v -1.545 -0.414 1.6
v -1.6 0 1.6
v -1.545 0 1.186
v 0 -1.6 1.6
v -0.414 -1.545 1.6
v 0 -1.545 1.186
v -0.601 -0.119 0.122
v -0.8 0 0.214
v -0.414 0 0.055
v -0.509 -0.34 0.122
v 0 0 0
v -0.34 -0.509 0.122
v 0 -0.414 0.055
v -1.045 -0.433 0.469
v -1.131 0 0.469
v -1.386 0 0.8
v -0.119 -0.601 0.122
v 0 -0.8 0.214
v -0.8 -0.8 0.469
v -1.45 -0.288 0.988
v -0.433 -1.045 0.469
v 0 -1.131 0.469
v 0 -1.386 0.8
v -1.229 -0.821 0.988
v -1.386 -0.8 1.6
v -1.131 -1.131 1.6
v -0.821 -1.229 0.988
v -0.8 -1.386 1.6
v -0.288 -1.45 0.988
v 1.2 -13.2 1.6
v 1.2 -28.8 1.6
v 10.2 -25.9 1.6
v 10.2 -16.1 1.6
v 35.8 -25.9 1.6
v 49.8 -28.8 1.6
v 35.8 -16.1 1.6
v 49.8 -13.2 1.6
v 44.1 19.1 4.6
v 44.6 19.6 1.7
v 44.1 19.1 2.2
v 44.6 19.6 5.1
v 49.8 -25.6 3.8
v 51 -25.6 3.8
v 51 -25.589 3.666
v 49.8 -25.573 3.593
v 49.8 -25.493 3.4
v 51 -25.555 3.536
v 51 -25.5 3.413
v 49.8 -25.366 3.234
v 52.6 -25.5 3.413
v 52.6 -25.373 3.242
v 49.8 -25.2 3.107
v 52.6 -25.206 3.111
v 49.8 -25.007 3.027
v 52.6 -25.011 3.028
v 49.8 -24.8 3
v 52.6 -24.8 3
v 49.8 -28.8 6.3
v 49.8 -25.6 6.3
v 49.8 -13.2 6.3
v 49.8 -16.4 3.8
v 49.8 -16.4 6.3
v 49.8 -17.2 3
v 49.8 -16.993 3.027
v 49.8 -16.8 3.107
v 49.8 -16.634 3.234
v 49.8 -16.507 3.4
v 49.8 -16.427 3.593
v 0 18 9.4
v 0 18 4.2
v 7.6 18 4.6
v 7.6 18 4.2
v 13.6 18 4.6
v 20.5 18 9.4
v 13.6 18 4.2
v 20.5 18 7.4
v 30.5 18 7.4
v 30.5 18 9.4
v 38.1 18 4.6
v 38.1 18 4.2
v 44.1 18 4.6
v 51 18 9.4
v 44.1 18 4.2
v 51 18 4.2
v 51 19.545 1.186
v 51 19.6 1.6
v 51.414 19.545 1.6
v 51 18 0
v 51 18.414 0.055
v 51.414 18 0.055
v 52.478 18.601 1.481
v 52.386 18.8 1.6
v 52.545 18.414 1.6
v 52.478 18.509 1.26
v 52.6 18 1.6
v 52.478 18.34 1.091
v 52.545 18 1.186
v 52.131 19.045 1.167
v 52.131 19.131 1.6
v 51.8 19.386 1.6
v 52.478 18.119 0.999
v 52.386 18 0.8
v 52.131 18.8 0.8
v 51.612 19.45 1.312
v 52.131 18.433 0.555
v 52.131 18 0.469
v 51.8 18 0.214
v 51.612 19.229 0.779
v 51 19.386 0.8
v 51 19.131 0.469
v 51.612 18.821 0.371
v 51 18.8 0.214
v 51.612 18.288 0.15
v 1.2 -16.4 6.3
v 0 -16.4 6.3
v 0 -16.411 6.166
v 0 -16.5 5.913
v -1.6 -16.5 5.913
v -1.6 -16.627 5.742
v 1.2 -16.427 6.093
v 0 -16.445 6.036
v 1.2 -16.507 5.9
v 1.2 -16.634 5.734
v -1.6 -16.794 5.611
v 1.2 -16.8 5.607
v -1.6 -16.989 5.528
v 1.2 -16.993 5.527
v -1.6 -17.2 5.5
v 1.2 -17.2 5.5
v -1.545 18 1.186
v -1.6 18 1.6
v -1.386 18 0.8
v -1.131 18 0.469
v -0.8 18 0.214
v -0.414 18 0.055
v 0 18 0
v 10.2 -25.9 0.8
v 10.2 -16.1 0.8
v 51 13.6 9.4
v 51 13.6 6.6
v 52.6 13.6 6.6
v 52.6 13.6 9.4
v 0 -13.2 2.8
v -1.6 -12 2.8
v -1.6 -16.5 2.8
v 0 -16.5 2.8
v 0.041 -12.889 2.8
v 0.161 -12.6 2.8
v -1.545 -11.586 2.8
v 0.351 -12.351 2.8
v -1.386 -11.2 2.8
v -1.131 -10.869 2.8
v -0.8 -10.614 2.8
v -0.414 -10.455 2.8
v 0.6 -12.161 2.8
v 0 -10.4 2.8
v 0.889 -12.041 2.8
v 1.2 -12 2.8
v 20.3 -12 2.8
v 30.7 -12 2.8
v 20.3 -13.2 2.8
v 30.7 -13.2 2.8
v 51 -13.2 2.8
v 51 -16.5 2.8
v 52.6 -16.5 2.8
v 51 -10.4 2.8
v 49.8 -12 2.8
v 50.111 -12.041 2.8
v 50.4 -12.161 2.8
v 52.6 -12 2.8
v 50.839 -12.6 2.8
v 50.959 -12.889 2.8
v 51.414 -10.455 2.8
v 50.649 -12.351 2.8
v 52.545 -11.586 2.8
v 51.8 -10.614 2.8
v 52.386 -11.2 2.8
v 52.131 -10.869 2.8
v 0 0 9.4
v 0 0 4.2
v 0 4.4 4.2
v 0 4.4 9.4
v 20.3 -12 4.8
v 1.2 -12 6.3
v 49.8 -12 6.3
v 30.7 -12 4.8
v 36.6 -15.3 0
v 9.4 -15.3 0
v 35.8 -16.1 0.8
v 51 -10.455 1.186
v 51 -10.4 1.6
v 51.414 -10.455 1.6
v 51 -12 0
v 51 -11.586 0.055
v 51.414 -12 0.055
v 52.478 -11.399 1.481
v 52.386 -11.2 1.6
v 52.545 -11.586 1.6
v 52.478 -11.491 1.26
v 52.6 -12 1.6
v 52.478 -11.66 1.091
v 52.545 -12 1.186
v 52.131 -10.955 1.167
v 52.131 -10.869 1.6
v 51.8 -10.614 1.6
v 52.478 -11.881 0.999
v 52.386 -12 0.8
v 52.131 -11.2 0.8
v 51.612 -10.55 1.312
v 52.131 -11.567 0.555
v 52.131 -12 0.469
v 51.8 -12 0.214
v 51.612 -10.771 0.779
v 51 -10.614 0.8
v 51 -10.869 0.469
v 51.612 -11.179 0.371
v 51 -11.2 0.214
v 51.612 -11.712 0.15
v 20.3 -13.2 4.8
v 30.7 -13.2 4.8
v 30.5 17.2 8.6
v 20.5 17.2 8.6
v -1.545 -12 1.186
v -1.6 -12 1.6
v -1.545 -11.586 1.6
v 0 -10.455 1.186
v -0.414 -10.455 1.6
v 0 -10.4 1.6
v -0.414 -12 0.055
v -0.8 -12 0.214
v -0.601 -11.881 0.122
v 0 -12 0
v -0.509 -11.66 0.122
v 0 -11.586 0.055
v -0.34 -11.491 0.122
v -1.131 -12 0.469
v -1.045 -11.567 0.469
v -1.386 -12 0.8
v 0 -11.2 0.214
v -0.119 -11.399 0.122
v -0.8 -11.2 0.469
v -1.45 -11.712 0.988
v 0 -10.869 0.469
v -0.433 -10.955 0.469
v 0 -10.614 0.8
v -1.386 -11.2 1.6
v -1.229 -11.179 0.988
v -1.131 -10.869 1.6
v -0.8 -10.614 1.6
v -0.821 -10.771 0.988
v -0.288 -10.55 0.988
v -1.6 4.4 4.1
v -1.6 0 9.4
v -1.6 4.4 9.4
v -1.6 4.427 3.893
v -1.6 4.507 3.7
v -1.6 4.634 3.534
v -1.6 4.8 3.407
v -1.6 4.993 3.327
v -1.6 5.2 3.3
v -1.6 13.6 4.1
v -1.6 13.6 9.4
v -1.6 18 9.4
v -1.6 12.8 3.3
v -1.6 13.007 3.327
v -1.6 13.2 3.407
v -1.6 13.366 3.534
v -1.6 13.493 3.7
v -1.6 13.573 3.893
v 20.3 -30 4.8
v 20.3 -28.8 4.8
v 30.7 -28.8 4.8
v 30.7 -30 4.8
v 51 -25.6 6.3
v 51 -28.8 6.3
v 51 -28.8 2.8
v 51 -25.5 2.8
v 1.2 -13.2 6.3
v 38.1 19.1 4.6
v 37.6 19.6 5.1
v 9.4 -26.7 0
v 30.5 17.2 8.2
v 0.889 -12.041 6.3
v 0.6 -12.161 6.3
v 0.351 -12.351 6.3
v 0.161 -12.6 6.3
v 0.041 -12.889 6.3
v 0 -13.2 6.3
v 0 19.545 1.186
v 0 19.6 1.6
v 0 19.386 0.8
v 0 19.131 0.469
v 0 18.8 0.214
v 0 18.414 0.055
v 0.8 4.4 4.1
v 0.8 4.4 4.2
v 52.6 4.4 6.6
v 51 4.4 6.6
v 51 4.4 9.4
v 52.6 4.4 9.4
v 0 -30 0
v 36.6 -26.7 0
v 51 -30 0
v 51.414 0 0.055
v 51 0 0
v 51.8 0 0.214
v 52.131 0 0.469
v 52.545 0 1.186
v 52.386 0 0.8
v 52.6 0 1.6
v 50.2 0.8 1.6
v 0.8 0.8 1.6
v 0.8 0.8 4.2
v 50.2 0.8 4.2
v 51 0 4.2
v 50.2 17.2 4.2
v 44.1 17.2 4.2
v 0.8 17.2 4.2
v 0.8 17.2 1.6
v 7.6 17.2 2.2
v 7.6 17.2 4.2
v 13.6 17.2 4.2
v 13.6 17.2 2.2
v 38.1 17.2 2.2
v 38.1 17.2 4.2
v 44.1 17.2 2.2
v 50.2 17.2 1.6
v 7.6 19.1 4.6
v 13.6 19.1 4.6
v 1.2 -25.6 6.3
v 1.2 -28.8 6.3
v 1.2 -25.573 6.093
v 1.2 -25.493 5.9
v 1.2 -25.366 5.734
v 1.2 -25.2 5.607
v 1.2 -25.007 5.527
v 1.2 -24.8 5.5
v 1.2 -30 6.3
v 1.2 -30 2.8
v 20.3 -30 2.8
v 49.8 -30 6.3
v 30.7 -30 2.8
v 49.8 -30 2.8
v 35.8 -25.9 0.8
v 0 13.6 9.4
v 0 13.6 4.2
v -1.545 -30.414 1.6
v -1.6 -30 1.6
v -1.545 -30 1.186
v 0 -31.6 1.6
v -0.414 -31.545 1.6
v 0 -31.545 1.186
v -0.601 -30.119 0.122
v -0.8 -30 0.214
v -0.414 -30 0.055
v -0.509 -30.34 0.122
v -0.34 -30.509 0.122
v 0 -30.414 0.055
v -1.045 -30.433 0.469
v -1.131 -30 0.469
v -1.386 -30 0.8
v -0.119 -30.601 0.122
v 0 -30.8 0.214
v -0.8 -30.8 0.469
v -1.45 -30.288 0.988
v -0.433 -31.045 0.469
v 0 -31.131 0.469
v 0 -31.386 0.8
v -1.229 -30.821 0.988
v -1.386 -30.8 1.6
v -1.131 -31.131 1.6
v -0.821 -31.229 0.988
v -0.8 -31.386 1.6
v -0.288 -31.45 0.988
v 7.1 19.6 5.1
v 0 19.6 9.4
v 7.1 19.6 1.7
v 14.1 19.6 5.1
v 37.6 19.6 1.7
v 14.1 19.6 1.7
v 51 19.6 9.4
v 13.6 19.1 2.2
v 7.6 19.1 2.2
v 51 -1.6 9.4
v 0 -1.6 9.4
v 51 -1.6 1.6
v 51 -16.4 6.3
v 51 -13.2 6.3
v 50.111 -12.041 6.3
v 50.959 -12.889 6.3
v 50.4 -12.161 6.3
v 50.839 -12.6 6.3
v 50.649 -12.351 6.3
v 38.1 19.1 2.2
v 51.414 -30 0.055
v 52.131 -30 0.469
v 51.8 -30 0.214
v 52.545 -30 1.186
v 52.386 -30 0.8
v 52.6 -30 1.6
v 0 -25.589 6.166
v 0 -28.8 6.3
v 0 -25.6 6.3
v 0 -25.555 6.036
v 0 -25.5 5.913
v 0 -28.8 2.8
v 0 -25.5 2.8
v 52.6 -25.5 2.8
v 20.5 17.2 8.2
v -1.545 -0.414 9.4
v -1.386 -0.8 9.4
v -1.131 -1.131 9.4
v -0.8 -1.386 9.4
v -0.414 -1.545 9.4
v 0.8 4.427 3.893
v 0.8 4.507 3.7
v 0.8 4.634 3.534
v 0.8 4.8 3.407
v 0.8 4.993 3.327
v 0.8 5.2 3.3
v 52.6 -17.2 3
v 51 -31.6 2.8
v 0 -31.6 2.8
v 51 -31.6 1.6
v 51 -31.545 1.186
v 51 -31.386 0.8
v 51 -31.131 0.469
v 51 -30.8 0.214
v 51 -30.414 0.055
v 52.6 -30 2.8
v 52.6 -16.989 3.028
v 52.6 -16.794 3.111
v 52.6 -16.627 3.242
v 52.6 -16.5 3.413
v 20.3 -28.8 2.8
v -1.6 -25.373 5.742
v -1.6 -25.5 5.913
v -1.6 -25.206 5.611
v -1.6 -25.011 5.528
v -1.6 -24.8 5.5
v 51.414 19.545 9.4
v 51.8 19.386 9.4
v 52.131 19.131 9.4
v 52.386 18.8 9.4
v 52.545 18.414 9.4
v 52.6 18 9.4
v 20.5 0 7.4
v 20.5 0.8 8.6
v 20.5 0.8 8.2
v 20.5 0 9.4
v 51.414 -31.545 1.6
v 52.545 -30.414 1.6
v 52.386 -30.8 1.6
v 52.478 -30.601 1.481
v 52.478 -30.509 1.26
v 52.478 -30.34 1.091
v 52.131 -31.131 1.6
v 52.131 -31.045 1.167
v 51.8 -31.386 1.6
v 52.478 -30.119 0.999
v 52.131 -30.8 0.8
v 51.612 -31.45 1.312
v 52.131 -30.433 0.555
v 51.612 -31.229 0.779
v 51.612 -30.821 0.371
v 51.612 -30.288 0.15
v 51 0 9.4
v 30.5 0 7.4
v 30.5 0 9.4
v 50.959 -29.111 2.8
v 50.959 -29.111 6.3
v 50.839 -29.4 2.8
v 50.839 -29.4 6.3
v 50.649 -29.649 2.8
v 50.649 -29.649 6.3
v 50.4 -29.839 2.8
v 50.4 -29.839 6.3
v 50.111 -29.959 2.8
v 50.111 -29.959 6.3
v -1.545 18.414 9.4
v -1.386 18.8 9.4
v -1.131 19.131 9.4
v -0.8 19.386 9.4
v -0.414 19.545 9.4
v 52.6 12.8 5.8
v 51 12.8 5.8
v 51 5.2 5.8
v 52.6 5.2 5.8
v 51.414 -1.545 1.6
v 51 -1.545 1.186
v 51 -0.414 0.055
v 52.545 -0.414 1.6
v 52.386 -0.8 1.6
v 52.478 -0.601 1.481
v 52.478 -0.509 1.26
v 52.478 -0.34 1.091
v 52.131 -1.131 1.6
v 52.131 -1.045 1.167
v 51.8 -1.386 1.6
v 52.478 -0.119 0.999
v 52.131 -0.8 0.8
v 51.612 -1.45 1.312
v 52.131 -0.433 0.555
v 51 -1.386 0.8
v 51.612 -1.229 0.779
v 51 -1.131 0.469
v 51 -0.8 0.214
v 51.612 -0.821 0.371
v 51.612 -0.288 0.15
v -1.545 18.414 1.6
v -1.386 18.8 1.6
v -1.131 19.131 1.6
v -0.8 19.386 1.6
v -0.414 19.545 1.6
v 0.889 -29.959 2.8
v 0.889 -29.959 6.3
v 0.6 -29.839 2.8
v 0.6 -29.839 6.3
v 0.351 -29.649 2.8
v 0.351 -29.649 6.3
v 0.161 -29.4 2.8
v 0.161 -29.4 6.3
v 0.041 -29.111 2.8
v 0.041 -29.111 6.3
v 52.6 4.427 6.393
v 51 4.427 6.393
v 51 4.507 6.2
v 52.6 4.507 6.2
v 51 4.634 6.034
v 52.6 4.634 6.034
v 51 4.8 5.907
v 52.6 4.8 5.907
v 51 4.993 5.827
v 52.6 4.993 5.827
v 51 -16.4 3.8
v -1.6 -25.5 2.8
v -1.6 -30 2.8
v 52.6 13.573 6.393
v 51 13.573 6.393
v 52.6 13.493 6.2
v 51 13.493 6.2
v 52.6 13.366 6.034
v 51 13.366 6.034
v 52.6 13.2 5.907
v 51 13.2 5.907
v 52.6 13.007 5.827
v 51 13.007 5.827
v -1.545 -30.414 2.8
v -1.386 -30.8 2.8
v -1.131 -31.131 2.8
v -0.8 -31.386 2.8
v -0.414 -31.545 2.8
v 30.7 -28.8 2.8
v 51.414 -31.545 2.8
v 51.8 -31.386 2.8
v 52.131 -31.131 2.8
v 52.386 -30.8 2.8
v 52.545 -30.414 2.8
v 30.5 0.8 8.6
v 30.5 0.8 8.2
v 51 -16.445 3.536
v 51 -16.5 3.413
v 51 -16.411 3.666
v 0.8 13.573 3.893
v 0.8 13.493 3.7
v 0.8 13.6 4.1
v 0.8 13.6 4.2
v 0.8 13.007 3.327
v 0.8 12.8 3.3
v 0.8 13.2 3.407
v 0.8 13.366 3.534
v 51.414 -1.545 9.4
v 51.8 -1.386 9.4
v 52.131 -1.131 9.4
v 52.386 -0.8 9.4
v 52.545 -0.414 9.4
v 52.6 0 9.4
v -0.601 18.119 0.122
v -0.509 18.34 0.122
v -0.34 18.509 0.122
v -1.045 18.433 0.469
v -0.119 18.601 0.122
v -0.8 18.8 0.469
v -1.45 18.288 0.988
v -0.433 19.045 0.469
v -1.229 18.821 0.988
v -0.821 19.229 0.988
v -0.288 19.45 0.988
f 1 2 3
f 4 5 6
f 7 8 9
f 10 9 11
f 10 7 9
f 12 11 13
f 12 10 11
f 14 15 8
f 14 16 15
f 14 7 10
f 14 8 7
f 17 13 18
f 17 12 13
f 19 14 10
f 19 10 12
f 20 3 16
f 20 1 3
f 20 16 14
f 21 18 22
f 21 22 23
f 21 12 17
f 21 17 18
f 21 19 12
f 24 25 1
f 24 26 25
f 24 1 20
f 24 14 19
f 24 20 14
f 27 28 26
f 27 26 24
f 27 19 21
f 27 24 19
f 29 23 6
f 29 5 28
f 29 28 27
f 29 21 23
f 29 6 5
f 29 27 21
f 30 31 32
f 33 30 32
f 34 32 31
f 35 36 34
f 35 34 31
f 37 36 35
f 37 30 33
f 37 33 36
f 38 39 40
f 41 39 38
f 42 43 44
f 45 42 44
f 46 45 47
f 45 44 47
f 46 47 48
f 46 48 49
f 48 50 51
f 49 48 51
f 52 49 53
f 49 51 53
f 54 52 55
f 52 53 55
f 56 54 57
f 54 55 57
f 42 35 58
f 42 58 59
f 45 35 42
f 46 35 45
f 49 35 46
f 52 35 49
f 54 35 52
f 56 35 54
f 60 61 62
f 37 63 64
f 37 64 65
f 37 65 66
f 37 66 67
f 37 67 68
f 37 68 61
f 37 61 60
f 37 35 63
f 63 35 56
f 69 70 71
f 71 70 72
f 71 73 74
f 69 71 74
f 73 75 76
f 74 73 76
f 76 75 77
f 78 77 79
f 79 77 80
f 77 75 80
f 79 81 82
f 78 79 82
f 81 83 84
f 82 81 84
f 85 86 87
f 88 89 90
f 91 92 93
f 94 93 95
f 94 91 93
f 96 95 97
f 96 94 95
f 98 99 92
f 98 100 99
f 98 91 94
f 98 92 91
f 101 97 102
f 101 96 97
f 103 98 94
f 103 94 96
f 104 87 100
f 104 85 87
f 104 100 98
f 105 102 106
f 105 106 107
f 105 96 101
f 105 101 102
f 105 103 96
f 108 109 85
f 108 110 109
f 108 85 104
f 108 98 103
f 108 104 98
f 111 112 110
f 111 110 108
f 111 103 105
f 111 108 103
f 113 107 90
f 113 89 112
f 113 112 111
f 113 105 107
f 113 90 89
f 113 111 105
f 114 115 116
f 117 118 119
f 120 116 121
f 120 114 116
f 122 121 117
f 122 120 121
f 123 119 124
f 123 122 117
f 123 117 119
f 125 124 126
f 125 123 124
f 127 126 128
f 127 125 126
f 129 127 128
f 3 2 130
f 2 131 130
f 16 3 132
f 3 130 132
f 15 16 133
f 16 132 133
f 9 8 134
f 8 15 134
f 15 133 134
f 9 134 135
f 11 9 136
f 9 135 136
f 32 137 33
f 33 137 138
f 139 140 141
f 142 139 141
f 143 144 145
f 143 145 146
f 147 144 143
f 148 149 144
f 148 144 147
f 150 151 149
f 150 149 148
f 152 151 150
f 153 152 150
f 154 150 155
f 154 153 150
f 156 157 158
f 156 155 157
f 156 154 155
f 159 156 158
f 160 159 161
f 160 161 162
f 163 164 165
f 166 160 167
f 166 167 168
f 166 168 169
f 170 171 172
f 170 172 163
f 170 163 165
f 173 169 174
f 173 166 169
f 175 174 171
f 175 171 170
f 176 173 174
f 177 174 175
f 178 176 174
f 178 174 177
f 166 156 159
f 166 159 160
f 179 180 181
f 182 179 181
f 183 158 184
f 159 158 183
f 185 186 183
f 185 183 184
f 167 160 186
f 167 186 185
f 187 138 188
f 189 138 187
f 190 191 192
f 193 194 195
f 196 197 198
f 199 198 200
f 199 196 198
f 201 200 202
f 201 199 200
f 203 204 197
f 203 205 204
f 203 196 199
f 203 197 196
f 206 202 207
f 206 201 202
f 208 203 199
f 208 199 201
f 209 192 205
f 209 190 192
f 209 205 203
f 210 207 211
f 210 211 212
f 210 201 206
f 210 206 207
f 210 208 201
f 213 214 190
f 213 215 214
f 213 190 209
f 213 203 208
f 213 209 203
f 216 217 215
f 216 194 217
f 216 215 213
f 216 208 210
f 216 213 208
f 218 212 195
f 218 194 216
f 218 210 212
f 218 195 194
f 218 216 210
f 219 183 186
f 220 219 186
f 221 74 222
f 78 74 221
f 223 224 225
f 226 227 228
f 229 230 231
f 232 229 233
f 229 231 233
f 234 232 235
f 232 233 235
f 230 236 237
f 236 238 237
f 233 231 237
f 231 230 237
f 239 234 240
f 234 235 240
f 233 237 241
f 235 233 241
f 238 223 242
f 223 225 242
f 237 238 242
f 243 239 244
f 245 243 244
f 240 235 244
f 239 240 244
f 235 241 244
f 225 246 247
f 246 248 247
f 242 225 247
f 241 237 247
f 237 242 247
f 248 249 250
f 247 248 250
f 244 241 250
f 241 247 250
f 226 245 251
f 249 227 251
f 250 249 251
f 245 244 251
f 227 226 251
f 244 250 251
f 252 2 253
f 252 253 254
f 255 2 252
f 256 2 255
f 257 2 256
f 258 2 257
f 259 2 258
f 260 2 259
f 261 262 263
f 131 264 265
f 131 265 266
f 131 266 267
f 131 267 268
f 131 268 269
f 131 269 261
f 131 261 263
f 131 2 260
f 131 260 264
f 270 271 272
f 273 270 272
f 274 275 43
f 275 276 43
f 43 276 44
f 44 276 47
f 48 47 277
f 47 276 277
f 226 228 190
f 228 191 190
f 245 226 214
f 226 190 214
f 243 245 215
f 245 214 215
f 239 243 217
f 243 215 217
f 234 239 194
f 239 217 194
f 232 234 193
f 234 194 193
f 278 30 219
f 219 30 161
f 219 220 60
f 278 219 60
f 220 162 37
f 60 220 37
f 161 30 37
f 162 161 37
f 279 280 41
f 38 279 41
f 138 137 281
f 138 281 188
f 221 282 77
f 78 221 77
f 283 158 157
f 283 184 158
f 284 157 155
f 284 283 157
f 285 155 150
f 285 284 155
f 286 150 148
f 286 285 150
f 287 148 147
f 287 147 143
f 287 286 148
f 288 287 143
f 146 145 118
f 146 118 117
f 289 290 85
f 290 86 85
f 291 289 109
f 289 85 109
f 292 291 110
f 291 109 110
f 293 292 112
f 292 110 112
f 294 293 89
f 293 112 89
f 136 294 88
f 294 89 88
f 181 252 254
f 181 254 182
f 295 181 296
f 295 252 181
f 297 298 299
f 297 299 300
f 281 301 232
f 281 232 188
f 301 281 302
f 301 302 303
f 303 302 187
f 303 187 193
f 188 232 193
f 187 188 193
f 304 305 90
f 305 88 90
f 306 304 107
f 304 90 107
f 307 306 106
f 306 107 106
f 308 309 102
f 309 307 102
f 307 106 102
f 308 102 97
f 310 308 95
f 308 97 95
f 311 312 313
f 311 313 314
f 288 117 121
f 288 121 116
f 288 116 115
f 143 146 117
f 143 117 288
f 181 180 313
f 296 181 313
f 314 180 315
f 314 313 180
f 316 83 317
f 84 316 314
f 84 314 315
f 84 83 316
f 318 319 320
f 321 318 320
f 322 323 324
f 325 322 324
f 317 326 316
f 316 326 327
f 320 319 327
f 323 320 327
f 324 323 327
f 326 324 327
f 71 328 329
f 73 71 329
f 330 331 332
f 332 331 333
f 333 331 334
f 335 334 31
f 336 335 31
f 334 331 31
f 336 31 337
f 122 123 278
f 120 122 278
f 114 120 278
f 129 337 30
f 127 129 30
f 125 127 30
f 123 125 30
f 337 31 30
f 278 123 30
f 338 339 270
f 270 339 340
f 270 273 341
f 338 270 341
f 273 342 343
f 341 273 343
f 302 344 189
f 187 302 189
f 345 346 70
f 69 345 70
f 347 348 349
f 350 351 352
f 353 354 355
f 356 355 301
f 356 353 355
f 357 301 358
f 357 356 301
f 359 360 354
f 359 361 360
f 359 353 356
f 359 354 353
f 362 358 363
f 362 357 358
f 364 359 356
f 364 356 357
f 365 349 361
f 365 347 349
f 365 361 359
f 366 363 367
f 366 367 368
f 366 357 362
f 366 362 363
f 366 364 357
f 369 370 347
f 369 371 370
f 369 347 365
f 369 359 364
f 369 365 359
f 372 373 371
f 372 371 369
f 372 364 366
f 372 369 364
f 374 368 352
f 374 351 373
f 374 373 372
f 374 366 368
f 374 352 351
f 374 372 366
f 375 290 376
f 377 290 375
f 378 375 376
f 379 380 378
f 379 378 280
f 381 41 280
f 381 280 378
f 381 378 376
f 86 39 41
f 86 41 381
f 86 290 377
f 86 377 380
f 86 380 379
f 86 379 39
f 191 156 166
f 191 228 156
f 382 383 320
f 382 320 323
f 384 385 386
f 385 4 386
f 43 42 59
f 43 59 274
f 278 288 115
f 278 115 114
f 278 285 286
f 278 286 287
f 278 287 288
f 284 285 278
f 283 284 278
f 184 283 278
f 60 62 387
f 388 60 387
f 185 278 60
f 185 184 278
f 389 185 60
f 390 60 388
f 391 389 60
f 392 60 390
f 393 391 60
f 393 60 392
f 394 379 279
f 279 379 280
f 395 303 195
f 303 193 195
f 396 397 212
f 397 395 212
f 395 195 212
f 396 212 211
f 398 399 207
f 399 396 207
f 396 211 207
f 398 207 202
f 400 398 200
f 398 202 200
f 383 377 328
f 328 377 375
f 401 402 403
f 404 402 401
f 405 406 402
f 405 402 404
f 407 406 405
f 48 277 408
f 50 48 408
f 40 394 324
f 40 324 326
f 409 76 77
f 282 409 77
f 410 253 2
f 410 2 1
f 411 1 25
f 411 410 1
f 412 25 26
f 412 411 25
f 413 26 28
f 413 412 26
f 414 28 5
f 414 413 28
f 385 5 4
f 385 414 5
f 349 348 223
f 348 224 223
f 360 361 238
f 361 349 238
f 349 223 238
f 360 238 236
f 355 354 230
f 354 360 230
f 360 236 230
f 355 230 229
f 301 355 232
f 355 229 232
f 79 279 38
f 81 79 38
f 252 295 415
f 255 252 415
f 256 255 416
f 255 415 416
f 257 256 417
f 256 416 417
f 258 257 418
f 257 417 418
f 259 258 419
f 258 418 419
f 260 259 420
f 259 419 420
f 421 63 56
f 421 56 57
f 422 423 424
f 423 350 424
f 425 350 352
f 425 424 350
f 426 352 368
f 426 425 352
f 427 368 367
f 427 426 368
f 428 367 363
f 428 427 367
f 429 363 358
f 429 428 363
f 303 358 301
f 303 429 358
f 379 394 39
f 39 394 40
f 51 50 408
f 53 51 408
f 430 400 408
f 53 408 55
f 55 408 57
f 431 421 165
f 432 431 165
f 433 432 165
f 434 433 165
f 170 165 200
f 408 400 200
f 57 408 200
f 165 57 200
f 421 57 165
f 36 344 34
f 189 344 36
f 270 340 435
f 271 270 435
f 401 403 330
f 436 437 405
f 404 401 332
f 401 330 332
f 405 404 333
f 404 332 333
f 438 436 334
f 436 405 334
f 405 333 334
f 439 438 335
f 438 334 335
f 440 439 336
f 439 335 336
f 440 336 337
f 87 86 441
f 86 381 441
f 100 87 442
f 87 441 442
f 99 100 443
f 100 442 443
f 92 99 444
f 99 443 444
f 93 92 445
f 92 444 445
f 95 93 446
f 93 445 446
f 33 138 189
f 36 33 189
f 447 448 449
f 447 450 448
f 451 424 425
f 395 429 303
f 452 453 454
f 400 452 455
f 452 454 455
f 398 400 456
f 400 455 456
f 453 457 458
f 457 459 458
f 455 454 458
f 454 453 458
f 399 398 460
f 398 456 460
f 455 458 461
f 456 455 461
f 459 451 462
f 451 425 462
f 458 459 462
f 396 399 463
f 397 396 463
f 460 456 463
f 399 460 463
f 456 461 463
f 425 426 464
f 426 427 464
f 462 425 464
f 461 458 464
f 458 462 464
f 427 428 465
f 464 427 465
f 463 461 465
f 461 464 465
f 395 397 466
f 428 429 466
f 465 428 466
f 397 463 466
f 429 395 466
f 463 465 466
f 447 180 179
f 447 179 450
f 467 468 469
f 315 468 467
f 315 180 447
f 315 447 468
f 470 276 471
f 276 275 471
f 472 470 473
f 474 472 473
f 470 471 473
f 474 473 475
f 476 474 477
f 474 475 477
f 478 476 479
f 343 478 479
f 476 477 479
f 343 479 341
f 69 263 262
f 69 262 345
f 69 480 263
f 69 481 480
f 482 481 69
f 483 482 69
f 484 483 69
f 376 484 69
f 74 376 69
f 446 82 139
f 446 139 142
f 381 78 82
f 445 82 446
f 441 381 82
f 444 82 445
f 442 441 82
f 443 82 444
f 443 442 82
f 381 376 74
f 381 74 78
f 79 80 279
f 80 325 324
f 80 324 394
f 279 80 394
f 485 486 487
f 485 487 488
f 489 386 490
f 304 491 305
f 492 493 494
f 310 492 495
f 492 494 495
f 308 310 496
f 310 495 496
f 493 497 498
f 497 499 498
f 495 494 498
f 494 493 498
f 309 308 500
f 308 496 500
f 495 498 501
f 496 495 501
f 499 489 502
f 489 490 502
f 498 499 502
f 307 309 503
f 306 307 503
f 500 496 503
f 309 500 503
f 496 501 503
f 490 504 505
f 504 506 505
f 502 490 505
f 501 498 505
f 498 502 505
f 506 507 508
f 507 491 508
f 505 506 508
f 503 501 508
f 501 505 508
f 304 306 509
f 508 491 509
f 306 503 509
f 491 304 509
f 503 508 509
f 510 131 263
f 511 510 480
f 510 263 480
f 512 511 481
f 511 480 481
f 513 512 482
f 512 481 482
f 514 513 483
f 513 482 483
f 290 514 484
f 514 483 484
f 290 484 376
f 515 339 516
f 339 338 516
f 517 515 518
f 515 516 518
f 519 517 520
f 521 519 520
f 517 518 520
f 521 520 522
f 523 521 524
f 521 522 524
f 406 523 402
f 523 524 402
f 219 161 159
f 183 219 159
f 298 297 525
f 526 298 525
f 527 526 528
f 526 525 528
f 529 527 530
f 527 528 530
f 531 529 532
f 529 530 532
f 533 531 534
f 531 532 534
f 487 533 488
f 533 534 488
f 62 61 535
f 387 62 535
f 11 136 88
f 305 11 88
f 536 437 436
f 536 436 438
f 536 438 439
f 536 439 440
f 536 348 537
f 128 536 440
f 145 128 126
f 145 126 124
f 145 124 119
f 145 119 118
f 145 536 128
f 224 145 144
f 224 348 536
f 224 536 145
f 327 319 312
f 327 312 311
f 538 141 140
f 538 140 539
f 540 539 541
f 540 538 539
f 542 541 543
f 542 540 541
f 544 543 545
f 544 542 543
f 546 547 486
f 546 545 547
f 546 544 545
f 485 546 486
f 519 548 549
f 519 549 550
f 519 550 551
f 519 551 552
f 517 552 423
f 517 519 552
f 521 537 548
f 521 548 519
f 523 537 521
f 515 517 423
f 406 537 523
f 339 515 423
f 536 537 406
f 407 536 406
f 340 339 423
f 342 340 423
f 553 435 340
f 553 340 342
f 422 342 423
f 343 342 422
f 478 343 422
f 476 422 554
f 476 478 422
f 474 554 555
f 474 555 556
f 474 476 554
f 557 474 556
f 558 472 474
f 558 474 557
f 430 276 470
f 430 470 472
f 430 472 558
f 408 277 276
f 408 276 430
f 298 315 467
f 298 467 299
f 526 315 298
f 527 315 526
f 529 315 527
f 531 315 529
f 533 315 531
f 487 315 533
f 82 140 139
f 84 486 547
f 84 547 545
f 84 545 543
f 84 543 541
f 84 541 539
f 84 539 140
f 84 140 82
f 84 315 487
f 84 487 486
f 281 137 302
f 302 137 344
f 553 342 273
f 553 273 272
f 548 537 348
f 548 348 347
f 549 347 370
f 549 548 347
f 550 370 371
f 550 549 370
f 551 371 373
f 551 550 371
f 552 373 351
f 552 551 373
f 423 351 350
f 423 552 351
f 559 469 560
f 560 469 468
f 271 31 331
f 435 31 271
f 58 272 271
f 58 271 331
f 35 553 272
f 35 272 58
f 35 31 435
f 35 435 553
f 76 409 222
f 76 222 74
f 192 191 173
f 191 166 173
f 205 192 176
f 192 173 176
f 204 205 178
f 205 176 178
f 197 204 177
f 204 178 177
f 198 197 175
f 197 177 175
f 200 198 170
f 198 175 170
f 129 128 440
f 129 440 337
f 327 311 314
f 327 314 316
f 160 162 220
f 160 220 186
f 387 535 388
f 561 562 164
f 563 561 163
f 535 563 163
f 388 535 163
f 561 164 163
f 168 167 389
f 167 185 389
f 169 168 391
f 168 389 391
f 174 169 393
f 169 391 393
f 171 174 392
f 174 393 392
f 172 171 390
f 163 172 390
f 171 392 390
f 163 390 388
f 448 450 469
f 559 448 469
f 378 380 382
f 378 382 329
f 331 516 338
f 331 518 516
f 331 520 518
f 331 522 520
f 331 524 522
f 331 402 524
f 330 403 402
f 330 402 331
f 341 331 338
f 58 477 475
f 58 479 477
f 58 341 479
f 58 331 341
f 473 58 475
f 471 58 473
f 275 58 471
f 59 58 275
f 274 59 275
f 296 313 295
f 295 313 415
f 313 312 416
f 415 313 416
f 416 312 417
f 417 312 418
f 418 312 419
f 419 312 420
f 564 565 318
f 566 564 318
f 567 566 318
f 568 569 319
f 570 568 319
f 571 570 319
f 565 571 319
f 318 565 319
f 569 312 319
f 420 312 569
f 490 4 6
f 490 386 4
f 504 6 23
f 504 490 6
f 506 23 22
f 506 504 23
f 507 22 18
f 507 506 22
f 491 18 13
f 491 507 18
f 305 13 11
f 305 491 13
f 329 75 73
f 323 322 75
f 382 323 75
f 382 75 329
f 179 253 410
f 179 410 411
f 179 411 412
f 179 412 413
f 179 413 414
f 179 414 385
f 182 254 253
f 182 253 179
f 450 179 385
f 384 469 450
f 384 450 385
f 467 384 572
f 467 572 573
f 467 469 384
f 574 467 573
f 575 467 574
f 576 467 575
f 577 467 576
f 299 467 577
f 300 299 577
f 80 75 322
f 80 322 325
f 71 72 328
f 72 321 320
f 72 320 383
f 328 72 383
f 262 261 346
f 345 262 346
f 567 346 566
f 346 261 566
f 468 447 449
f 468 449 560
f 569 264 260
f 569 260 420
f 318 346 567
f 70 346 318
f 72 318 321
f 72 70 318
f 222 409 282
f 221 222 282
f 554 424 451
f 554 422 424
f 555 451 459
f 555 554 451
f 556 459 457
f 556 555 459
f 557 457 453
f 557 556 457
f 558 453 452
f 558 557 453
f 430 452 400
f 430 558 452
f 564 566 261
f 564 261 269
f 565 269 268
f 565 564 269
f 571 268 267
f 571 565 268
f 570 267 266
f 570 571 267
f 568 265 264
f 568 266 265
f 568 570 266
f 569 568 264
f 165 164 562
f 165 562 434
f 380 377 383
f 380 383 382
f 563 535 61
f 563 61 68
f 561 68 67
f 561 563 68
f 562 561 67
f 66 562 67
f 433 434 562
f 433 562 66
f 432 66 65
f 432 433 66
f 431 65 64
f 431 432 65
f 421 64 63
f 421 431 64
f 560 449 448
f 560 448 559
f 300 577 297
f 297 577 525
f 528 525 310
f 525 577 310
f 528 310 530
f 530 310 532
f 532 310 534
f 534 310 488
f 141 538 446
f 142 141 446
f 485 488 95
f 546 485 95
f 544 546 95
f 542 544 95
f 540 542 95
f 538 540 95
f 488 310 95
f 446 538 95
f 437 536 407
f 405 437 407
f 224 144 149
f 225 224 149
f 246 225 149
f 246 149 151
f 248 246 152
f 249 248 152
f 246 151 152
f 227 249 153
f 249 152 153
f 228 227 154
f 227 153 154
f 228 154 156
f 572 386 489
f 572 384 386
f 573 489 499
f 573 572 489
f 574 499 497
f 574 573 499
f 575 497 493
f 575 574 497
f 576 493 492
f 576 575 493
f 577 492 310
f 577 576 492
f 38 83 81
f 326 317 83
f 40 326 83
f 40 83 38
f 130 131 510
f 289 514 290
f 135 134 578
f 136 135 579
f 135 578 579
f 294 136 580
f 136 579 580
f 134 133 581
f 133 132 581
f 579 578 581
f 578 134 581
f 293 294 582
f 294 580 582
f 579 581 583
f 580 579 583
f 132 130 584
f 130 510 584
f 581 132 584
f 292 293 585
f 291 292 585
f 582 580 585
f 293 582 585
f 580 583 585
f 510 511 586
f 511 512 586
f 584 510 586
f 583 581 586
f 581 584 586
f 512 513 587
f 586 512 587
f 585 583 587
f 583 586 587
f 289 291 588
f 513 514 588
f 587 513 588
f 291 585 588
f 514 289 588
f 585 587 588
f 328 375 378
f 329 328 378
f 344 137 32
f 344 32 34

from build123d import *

# Parameters (mm, degrees)
BOX009_W        = 6
BOX009_H        = 10
BOX009_DEPTH    = 2.4
BOX006_W        = 10
BOX006_H        = 9.2
BOX006_DEPTH    = 7
FILLET002_R     = 0.8
BOX019_W        = 10
BOX019_H        = 9.2
BOX019_DEPTH    = 7
FILLET003_R     = 0.8
BOX008_W        = 6
BOX008_H        = 10
BOX008_DEPTH    = 2.4
BOX003_W        = 49.4
BOX003_H        = 16.4
BOX003_DEPTH    = 2.6
BOX002_W        = 51
BOX002_H        = 18
BOX002_DEPTH    = 2.6
BOX004_W        = 10
BOX004_H        = 1
BOX004_DEPTH    = 2
CHAMFER_SIZE    = 0.8
BOX005_W        = 10
BOX005_H        = 1
BOX005_DEPTH    = 2
CHAMFER001_SIZE = 0.8
BOX001_W        = 51
BOX001_H        = 18
BOX001_DEPTH    = 9.4
BOX_W           = 54.2
BOX_H           = 21.2
BOX_DEPTH       = 9.4
FILLET_R        = 1.6
CHAMFER002_SIZE = 0.5
BOX017_W        = 10.4
BOX017_H        = 5
BOX017_DEPTH    = 2
BOX018_W        = 10.4
BOX018_H        = 5
BOX018_DEPTH    = 2
BOX020_W        = 10
BOX020_H        = 9.2
BOX020_DEPTH    = 4.6
FILLET004_R     = 0.8
BOX021_W        = 10
BOX021_H        = 9.2
BOX021_DEPTH    = 6
FILLET005_R     = 0.8
BOX014_W        = 25.6
BOX014_H        = 9.8
BOX014_DEPTH    = 1.6
BOX013_W        = 48.6
BOX013_H        = 15.6
BOX013_DEPTH    = 4.8
BOX012_W        = 51
BOX012_H        = 18
BOX012_DEPTH    = 4.7
BOX022_W        = 1.6
BOX022_H        = 9
BOX022_DEPTH    = 5
BOX023_W        = 1.6
BOX023_H        = 9
BOX023_DEPTH    = 5
BOX011_W        = 51
BOX011_H        = 18
BOX011_DEPTH    = 9.4
BOX010_W        = 54.2
BOX010_H        = 21.2
BOX010_DEPTH    = 2.8
FILLET001_R     = 1.6
CHAMFER003_SIZE = 0.8
FILLET006_R     = 1.2


with BuildPart() as button2:
    # Box009 → Box009 (new body)
    with BuildSketch(Plane(origin=(38.1, 14, 2.2), x_dir=(1, 0, 0), z_dir=(0, 0, 1))):
        with Locations((3, 5)):
            Rectangle(BOX009_W, BOX009_H)
    extrude(amount=BOX009_DEPTH)


with BuildPart() as usb_buchse1:
    # Box006 → Box006 (new body)
    with BuildSketch(Plane(origin=(-5, 4.4, 3.3), x_dir=(1, 0, 0), z_dir=(0, 0, 1))):
        with Locations((5, 4.6)):
            Rectangle(BOX006_W, BOX006_H)
    extrude(amount=BOX006_DEPTH)

    # Fillet002
    fillet002_edges = [usb_buchse1.edges().sort_by_distance(p)[0] for p in [
        (0, 4.4, 3.3),
        (0, 13.6, 3.3),
    ]]
    fillet(fillet002_edges, radius=FILLET002_R)


with BuildPart() as usb_buchse2:
    # Box019 → Box019 (new body)
    with BuildSketch(Plane(origin=(47, 4.4, 5.8), x_dir=(1, 0, 0), z_dir=(0, 0, 1))):
        with Locations((5, 4.6)):
            Rectangle(BOX019_W, BOX019_H)
    extrude(amount=BOX019_DEPTH)

    # Fillet003
    fillet003_edges = [usb_buchse2.edges().sort_by_distance(p)[0] for p in [
        (52, 4.4, 5.8),
        (52, 13.6, 5.8),
    ]]
    fillet(fillet003_edges, radius=FILLET003_R)


with BuildPart() as bottom_cutouts:
    # Box008 → Box008 (new body)
    with BuildSketch(Plane(origin=(7.6, 14, 2.2), x_dir=(1, 0, 0), z_dir=(0, 0, 1))):
        with Locations((3, 5)):
            Rectangle(BOX008_W, BOX008_H)
    extrude(amount=BOX008_DEPTH)

    # Fusion001: union Button2, USB_Buchse1, USB_Buchse2
    add(button2.part)
    add(usb_buchse1.part)
    add(usb_buchse2.part)


with BuildPart() as auflage_innen:
    # Box003 → Box003 (new body)
    with BuildSketch(Plane(origin=(0.8, 0.8, 1.6), x_dir=(1, 0, 0), z_dir=(0, 0, 1))):
        with Locations((24.7, 8.2)):
            Rectangle(BOX003_W, BOX003_H)
    extrude(amount=BOX003_DEPTH)


with BuildPart() as auflage:
    # Box002 → Box002 (new body)
    with BuildSketch(Plane.XY.offset(1.6)):
        with Locations((25.5, 9)):
            Rectangle(BOX002_W, BOX002_H)
    extrude(amount=BOX002_DEPTH)

    # Cut001: cut Auflage_innen
    add(auflage_innen.part, mode=Mode.SUBTRACT)


with BuildPart() as haken1:
    # Box004 → Box004 (new body)
    with BuildSketch(Plane(origin=(20.5, -0.2, 7.4), x_dir=(1, 0, 0), z_dir=(0, 0, 1))):
        with Locations((5, 0.5)):
            Rectangle(BOX004_W, BOX004_H)
    extrude(amount=BOX004_DEPTH)

    # Chamfer
    chamfer_edges = [haken1.edges().sort_by_distance(p)[0] for p in [
        (25.5, 0.8, 7.4),
        (25.5, 0.8, 9.4),
    ]]
    chamfer(chamfer_edges, length=CHAMFER_SIZE)


with BuildPart() as haken2:
    # Box005 → Box005 (new body)
    with BuildSketch(Plane(origin=(20.5, 17.2, 7.4), x_dir=(1, 0, 0), z_dir=(0, 0, 1))):
        with Locations((5, 0.5)):
            Rectangle(BOX005_W, BOX005_H)
    extrude(amount=BOX005_DEPTH)

    # Chamfer001
    chamfer001_edges = [haken2.edges().sort_by_distance(p)[0] for p in [
        (25.5, 17.2, 7.4),
        (25.5, 17.2, 9.4),
    ]]
    chamfer(chamfer001_edges, length=CHAMFER001_SIZE)


with BuildPart() as unten_innen:
    # Box001 → Box001 (new body)
    with BuildSketch(Plane.XY.offset(1.6)):
        with Locations((25.5, 9)):
            Rectangle(BOX001_W, BOX001_H)
    extrude(amount=BOX001_DEPTH)


with BuildPart() as case_bottom:
    # Box → Box (new body)
    with BuildSketch(Plane(origin=(-1.6, -1.6, 0), x_dir=(1, 0, 0), z_dir=(0, 0, 1))):
        with Locations((27.1, 10.6)):
            Rectangle(BOX_W, BOX_H)
    extrude(amount=BOX_DEPTH)

    # Cut: cut unten_innen
    add(unten_innen.part, mode=Mode.SUBTRACT)

    # Fillet
    fillet_edges = [case_bottom.edges().sort_by_distance(p)[0] for p in [
        (-1.6, -1.6, 4.7),
        (-1.6, 19.6, 4.7),
        (-1.6, 9, 0),
        (25.5, -1.6, 0),
        (52.6, -1.6, 4.7),
        (25.5, 19.6, 0),
        (52.6, 19.6, 4.7),
        (52.6, 9, 0),
    ]]
    fillet(fillet_edges, radius=FILLET_R)

    # Fusion: union Auflage, Haken1, Haken2
    add(auflage.part)
    add(haken1.part)
    add(haken2.part)

    # Cut004: cut bottom_cutouts
    add(bottom_cutouts.part, mode=Mode.SUBTRACT)

    # Chamfer002
    chamfer002_edges = [case_bottom.edges().sort_by_distance(p)[0] for p in [
        (10.6, 19.6, 4.6),
        (13.6, 19.6, 3.4),
        (10.6, 19.6, 2.2),
        (7.6, 19.6, 3.4),
        (44.1, 19.6, 3.4),
        (41.1, 19.6, 2.2),
        (38.1, 19.6, 3.4),
        (41.1, 19.6, 4.6),
    ]]
    chamfer(chamfer002_edges, length=CHAMFER002_SIZE)


with BuildPart() as oese1:
    # Box017 → Box017 (new body)
    with BuildSketch(Plane(origin=(20.3, -33, 2.8), x_dir=(1, 0, 0), z_dir=(0, 0, 1))):
        with Locations((5.2, 2.5)):
            Rectangle(BOX017_W, BOX017_H)
    extrude(amount=BOX017_DEPTH)


with BuildPart() as oese2:
    # Box018 → Box018 (new body)
    with BuildSketch(Plane(origin=(20.3, -15, 2.8), x_dir=(1, 0, 0), z_dir=(0, 0, 1))):
        with Locations((5.2, 2.5)):
            Rectangle(BOX018_W, BOX018_H)
    extrude(amount=BOX018_DEPTH)


with BuildPart() as usb_buchse3:
    # Box020 → Box020 (new body)
    with BuildSketch(Plane(origin=(-5, -25.6, 5.5), x_dir=(1, 0, 0), z_dir=(0, 0, 1))):
        with Locations((5, 4.6)):
            Rectangle(BOX020_W, BOX020_H)
    extrude(amount=BOX020_DEPTH)

    # Fillet004
    fillet004_edges = [usb_buchse3.edges().sort_by_distance(p)[0] for p in [
        (0, -25.6, 5.5),
        (0, -16.4, 5.5),
    ]]
    fillet(fillet004_edges, radius=FILLET004_R)


with BuildPart() as usb_buchse4:
    # Box021 → Box021 (new body)
    with BuildSketch(Plane(origin=(47, -25.6, 3), x_dir=(1, 0, 0), z_dir=(0, 0, 1))):
        with Locations((5, 4.6)):
            Rectangle(BOX021_W, BOX021_H)
    extrude(amount=BOX021_DEPTH)

    # Fillet005
    fillet005_edges = [usb_buchse4.edges().sort_by_distance(p)[0] for p in [
        (52, -25.6, 3),
        (52, -16.4, 3),
    ]]
    fillet(fillet005_edges, radius=FILLET005_R)


with BuildPart() as top_cutouts:
    # Box014 → Box014 (new body)
    with BuildSketch(Plane(origin=(10.2, -25.9, 0), x_dir=(1, 0, 0), z_dir=(0, 0, 1))):
        with Locations((12.8, 4.9)):
            Rectangle(BOX014_W, BOX014_H)
    extrude(amount=BOX014_DEPTH)

    # Fusion003: union Oese1, Oese2, USB-Buchse3, USB-Buchse4
    add(oese1.part)
    add(oese2.part)
    add(usb_buchse3.part)
    add(usb_buchse4.part)


with BuildPart() as rahmen_innen:
    # Box013 → Box013 (new body)
    with BuildSketch(Plane(origin=(1.2, -28.8, 1.6), x_dir=(1, 0, 0), z_dir=(0, 0, 1))):
        with Locations((24.3, 7.8)):
            Rectangle(BOX013_W, BOX013_H)
    extrude(amount=BOX013_DEPTH)


with BuildPart() as rahmen:
    # Box012 → Box012 (new body)
    with BuildSketch(Plane(origin=(0, -30, 1.6), x_dir=(1, 0, 0), z_dir=(0, 0, 1))):
        with Locations((25.5, 9)):
            Rectangle(BOX012_W, BOX012_H)
    extrude(amount=BOX012_DEPTH)

    # Cut003: cut Rahmen_innen
    add(rahmen_innen.part, mode=Mode.SUBTRACT)


with BuildPart() as nut1:
    # Box022 → Box022 (new body)
    with BuildSketch(Plane(origin=(-1.6, -25.5, 2.8), x_dir=(1, 0, 0), z_dir=(0, 0, 1))):
        with Locations((0.8, 4.5)):
            Rectangle(BOX022_W, BOX022_H)
    extrude(amount=BOX022_DEPTH)


with BuildPart() as nut2:
    # Box023 → Box023 (new body)
    with BuildSketch(Plane(origin=(51, -25.5, 2.8), x_dir=(1, 0, 0), z_dir=(0, 0, 1))):
        with Locations((0.8, 4.5)):
            Rectangle(BOX023_W, BOX023_H)
    extrude(amount=BOX023_DEPTH)


with BuildPart() as oben_innen:
    # Box011 → Box011 (new body)
    with BuildSketch(Plane(origin=(0, -30, 1.6), x_dir=(1, 0, 0), z_dir=(0, 0, 1))):
        with Locations((25.5, 9)):
            Rectangle(BOX011_W, BOX011_H)
    extrude(amount=BOX011_DEPTH)


with BuildPart() as case_top:
    # Box010 → Box010 (new body)
    with BuildSketch(Plane(origin=(-1.6, -31.6, 0), x_dir=(1, 0, 0), z_dir=(0, 0, 1))):
        with Locations((27.1, 10.6)):
            Rectangle(BOX010_W, BOX010_H)
    extrude(amount=BOX010_DEPTH)

    # Cut002: cut oben_innen
    add(oben_innen.part, mode=Mode.SUBTRACT)

    # Fillet001
    fillet001_edges = [case_top.edges().sort_by_distance(p)[0] for p in [
        (-1.6, -31.6, 1.4),
        (-1.6, -10.4, 1.4),
        (-1.6, -21, 0),
        (25.5, -31.6, 0),
        (52.6, -31.6, 1.4),
        (25.5, -10.4, 0),
        (52.6, -10.4, 1.4),
        (52.6, -21, 0),
    ]]
    fillet(fillet001_edges, radius=FILLET001_R)

    # Fusion002: union Rahmen, Nut1, Nut2
    add(rahmen.part)
    add(nut1.part)
    add(nut2.part)

    # Cut005: cut top_cutouts
    add(top_cutouts.part, mode=Mode.SUBTRACT)

    # Chamfer003
    chamfer003_edges = [case_top.edges().sort_by_distance(p)[0] for p in [
        (35.8, -21, 0),
        (23, -16.1, 0),
        (10.2, -21, 0),
        (23, -25.9, 0),
    ]]
    chamfer(chamfer003_edges, length=CHAMFER003_SIZE)

    # Fillet006
    fillet006_edges = [case_top.edges().sort_by_distance(p)[0] for p in [
        (0, -30, 4.55),
        (51, -30, 4.55),
        (51, -12, 4.55),
        (0, -12, 4.55),
    ]]
    fillet(fillet006_edges, radius=FILLET006_R)


solid = Compound([case_bottom.part, case_top.part])
